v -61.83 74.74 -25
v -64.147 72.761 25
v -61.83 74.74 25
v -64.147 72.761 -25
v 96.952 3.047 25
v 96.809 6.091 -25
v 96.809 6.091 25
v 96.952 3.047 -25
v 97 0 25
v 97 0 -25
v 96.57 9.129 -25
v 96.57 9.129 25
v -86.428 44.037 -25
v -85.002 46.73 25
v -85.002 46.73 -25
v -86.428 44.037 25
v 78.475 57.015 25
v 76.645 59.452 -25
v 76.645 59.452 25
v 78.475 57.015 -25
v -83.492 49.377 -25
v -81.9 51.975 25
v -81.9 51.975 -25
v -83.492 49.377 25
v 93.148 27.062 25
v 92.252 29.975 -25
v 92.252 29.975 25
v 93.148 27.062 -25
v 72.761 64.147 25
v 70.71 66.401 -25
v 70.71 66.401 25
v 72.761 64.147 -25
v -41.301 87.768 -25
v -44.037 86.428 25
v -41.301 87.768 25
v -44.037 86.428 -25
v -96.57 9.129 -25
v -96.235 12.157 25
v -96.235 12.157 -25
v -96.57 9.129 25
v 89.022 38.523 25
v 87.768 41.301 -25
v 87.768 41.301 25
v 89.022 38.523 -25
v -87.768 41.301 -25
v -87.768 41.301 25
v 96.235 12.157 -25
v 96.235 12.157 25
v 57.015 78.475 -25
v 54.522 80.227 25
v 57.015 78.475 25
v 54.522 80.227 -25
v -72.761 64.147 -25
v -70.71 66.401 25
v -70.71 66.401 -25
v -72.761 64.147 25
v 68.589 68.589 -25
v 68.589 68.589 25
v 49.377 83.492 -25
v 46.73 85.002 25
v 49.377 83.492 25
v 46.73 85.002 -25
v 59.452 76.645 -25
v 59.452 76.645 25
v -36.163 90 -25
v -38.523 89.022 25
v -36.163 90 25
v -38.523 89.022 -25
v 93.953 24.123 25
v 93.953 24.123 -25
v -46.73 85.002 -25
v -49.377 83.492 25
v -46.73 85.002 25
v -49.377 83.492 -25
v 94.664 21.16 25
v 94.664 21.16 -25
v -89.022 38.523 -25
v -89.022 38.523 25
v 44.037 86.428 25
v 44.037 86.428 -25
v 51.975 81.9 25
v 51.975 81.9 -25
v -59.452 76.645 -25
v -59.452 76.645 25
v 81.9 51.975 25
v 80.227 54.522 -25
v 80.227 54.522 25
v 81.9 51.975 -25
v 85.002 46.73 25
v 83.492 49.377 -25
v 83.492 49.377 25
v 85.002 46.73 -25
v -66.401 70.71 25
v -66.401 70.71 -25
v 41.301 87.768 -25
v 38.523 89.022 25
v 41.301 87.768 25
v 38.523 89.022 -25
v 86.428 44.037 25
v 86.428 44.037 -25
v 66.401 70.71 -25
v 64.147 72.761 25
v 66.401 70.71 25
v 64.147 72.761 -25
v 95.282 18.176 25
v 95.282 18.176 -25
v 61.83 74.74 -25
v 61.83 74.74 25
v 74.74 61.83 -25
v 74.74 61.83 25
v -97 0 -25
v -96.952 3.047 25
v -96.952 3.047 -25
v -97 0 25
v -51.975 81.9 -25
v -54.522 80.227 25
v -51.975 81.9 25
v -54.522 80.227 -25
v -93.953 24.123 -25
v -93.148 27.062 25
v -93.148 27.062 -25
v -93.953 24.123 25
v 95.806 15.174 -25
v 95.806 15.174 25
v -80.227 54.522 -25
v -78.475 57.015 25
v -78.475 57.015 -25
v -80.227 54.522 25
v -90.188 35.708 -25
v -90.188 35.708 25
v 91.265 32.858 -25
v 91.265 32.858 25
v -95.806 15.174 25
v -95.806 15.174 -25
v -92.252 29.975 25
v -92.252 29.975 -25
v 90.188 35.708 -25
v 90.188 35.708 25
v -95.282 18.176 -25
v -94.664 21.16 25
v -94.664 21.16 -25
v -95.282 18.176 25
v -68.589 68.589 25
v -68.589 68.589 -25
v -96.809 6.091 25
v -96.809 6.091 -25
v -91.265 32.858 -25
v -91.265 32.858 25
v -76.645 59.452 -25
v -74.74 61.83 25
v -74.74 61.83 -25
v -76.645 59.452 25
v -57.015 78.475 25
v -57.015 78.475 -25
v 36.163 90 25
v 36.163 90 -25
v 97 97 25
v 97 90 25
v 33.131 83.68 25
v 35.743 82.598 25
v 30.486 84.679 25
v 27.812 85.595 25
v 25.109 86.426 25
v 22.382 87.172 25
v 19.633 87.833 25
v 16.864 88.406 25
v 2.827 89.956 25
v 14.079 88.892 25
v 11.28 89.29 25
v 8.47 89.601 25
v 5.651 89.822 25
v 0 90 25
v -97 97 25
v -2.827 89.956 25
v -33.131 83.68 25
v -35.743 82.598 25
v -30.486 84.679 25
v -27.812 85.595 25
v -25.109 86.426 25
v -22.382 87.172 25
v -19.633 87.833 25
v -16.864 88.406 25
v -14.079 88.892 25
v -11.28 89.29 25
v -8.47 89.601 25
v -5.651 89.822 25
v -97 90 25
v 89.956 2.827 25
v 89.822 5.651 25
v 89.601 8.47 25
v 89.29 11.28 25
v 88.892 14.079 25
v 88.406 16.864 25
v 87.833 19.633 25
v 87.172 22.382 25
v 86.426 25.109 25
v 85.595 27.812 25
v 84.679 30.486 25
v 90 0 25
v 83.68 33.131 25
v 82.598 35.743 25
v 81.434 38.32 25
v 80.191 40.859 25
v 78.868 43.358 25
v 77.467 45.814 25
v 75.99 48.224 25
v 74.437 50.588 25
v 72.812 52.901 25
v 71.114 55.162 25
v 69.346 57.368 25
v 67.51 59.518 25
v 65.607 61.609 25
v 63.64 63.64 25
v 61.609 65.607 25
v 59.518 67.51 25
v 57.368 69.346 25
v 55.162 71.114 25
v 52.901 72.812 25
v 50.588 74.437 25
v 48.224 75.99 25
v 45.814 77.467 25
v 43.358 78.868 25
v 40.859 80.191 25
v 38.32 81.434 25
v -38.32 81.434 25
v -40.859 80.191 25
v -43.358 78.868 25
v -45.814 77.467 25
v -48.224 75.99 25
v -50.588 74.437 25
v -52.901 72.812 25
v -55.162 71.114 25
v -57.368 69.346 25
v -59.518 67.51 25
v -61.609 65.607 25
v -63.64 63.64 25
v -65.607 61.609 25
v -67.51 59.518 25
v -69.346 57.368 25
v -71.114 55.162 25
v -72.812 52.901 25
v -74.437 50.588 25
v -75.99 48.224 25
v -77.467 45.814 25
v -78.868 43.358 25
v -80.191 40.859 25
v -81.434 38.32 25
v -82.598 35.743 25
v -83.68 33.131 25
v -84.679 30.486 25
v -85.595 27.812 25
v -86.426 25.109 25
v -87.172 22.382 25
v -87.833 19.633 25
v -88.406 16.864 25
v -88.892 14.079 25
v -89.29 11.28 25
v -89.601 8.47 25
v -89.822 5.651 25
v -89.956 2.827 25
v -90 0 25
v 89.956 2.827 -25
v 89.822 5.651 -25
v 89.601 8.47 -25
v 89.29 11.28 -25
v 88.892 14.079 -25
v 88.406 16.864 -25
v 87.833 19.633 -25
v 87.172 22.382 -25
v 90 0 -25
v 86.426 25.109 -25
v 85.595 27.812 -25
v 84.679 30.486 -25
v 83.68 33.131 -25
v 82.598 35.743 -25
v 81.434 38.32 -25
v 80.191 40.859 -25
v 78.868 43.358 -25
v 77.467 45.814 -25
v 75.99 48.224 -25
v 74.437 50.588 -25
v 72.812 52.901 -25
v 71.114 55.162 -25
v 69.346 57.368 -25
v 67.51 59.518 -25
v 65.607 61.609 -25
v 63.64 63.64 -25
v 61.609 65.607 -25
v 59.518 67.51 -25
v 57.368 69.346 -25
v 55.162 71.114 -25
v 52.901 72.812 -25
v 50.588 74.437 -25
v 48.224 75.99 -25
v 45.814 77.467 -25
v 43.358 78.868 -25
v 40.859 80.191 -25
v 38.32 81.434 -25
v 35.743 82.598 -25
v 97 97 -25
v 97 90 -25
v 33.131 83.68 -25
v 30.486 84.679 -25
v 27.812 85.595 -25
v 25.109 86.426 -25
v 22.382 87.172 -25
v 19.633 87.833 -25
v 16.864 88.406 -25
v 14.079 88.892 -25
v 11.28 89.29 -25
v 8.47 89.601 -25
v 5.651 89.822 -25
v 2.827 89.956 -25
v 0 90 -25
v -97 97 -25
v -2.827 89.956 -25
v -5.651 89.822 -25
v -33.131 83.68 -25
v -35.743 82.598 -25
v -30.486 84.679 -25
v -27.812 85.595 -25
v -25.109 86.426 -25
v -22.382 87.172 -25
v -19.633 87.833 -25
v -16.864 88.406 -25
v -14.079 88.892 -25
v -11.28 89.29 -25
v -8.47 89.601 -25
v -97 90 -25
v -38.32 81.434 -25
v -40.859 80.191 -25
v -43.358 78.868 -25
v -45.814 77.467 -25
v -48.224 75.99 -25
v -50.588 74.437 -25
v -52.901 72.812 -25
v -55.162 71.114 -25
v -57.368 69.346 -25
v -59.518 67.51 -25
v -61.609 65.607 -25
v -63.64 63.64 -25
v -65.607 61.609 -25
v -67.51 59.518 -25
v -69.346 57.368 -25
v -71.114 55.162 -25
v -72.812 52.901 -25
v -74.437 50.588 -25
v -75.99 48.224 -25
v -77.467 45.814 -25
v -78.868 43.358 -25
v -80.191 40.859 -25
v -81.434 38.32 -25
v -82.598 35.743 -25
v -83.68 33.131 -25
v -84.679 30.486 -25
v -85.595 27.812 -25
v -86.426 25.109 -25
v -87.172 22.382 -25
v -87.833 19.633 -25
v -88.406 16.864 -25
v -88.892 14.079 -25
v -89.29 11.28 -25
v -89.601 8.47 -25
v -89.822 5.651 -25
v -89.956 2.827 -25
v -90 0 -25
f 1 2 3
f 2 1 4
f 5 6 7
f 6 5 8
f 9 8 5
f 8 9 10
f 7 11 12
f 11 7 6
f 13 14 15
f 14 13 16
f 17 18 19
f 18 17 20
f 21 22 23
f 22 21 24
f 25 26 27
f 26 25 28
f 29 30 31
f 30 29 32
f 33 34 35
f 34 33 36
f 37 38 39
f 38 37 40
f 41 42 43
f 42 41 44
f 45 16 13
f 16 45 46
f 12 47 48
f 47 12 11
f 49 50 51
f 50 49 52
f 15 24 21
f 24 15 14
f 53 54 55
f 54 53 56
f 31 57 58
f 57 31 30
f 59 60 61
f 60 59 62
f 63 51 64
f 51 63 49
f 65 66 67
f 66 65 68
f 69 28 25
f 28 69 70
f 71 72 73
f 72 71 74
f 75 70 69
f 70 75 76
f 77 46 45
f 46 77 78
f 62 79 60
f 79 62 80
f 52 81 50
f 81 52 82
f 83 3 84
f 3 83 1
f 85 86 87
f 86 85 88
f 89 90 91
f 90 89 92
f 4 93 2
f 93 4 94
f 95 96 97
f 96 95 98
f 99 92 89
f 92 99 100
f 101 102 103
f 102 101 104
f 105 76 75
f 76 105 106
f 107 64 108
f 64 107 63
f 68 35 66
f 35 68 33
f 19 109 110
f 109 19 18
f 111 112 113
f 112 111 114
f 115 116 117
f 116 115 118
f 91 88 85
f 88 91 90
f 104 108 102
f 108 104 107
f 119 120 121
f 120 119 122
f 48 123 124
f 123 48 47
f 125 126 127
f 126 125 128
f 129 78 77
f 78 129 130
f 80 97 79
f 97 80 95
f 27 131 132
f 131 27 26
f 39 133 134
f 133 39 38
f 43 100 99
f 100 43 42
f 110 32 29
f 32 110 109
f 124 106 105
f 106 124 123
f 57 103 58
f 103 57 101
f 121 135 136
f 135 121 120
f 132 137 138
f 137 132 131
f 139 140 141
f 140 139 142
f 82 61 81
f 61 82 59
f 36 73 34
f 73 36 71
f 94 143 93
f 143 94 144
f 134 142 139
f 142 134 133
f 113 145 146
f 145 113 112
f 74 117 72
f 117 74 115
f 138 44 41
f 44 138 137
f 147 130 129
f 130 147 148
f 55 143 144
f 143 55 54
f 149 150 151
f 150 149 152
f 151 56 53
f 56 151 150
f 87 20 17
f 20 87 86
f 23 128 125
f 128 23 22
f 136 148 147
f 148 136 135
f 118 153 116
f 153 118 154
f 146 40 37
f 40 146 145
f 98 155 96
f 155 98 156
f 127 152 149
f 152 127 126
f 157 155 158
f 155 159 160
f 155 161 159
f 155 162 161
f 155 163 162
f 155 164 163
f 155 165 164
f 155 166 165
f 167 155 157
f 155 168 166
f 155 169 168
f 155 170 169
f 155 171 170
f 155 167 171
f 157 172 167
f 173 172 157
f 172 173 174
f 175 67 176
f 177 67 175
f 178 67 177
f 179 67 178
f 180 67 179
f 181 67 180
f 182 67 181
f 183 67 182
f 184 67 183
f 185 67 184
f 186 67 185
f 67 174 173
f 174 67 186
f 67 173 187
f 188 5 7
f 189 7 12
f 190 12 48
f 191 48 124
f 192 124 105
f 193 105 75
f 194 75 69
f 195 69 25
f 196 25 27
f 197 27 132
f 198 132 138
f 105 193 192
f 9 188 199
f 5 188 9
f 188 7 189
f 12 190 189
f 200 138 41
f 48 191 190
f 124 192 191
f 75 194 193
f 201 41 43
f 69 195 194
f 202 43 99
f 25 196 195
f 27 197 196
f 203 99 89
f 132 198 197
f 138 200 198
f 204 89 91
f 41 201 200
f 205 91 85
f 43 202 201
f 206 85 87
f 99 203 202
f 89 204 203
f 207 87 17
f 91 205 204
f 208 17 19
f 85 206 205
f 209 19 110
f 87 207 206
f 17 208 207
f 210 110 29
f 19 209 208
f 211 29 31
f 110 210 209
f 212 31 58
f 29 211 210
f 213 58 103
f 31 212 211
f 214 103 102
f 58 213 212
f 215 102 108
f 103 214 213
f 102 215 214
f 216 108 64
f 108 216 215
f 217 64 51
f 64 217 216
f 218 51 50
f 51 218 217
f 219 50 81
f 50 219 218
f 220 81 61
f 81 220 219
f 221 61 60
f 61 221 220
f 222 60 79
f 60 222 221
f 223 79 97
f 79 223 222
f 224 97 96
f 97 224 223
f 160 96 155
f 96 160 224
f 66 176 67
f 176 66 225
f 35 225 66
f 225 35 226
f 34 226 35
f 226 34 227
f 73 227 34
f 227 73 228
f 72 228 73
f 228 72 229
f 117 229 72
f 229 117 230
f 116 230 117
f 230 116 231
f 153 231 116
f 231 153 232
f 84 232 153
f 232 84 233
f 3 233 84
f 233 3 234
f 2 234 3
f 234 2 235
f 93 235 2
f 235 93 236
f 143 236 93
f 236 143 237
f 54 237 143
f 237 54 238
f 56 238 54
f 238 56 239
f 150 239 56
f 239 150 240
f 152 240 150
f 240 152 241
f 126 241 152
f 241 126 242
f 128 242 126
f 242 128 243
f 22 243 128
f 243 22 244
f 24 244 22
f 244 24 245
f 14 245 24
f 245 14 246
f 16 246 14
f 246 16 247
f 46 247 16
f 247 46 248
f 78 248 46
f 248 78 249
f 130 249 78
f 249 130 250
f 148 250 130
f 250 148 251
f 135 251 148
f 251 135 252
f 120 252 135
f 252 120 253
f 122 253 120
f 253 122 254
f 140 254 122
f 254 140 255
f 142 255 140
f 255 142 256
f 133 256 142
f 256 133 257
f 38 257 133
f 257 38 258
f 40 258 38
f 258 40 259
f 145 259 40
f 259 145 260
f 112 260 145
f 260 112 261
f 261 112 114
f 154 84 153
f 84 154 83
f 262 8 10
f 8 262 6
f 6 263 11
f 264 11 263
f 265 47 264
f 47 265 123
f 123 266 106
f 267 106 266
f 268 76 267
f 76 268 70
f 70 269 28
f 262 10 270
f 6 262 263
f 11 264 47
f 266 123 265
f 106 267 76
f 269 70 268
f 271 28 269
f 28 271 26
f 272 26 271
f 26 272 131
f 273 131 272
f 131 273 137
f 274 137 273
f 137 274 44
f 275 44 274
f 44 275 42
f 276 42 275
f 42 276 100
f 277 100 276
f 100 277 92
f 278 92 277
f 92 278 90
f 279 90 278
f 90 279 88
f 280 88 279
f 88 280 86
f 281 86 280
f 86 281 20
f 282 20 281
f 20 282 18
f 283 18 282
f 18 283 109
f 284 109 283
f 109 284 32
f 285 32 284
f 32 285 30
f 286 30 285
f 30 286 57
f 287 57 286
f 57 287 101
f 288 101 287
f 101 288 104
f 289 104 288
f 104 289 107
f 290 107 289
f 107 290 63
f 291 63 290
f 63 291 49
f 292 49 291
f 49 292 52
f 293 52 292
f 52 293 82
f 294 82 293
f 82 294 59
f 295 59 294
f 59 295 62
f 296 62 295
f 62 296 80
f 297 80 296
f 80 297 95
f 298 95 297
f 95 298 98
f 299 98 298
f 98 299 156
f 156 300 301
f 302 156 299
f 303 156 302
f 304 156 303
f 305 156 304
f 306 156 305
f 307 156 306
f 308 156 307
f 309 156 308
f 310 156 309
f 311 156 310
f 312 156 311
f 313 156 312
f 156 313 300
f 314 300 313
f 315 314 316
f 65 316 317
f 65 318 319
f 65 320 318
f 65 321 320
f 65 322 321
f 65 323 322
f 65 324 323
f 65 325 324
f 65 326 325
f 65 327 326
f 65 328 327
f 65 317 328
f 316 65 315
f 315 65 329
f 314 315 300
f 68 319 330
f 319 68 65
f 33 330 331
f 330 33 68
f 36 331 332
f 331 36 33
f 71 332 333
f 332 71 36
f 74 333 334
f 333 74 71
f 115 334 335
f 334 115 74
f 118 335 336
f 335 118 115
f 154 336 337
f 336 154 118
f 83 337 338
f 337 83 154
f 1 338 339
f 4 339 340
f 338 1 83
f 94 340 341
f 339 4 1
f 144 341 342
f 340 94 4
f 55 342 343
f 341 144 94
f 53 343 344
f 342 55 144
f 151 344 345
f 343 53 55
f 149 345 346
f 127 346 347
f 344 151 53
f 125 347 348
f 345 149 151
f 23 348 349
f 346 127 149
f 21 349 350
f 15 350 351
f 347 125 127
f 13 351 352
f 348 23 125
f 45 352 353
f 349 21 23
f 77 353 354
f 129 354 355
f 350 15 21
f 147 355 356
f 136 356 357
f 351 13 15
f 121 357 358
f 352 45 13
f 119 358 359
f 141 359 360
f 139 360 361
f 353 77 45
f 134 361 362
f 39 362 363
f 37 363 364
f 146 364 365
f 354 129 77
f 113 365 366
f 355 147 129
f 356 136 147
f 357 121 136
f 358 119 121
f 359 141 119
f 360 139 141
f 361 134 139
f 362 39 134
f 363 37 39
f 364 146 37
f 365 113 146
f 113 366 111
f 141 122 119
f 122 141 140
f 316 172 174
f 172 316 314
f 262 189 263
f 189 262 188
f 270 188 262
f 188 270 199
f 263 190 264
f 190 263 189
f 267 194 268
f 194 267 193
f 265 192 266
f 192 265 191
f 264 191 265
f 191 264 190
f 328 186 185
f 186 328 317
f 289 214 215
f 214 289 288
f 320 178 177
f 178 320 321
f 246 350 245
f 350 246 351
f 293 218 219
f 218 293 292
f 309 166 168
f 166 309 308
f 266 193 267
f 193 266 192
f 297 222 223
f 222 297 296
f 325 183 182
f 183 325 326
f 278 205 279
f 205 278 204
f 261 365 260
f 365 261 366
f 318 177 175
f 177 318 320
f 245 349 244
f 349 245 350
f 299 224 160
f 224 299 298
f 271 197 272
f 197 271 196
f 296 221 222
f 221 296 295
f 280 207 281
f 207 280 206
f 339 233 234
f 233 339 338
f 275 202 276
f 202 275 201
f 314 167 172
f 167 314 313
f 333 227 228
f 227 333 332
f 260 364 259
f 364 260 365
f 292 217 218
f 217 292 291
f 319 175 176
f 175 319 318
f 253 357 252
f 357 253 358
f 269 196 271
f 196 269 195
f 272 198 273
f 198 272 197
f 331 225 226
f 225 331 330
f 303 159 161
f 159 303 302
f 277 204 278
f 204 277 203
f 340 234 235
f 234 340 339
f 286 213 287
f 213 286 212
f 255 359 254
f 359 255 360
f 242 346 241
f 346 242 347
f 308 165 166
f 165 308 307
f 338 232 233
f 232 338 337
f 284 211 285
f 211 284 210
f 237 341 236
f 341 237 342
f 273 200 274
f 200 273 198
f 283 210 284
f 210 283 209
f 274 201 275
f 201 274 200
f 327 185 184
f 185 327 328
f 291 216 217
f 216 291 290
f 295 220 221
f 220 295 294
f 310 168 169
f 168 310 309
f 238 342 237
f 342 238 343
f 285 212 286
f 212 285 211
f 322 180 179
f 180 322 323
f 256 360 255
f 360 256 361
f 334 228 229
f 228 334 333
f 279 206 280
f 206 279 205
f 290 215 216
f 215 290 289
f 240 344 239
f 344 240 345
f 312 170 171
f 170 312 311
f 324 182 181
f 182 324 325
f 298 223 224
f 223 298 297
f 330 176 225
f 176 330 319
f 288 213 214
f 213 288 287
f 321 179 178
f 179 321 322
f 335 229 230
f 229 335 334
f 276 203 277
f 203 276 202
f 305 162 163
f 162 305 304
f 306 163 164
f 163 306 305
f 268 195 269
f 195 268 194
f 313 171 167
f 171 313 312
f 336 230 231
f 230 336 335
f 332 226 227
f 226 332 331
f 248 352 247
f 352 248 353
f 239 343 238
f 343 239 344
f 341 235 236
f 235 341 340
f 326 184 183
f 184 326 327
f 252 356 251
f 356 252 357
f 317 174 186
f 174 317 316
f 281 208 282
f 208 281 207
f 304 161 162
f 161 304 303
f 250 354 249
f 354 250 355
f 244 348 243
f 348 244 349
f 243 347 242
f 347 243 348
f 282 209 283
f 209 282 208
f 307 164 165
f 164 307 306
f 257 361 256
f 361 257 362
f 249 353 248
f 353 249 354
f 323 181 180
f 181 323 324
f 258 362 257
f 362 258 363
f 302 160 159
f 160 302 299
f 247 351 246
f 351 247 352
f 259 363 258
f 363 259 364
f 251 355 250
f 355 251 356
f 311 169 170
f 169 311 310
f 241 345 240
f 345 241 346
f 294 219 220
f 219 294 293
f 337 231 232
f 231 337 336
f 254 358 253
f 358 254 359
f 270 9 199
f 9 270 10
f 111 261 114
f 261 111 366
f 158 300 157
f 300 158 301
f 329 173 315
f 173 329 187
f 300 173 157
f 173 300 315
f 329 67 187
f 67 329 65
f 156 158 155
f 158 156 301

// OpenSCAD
$fn = 200;
Height = 50;
Radius = 90;
Walls = 7;

module tube(h, r_inner, thickness) {
    difference() {
        cylinder(h, r=r_inner + thickness, center=true);
        cylinder(h + 0.01, r=r_inner, center=true);
    }
}

module Plane() {
    w = (Radius + Walls)*2;
    translate([0, Radius + Walls/2, 0])
        cube([w, Walls, Height], center=true);
}

module Crescent() {
    w = (Radius + Walls)*2;
    difference() {
        tube(h=Height, r_inner=Radius, thickness=Walls);
        translate([0, -w/4, 0])
            cube([w + 0.01, w/2, Height + 0.01], center=true);
    }
}

module All() {
    Plane();
    Crescent();
}

All();
